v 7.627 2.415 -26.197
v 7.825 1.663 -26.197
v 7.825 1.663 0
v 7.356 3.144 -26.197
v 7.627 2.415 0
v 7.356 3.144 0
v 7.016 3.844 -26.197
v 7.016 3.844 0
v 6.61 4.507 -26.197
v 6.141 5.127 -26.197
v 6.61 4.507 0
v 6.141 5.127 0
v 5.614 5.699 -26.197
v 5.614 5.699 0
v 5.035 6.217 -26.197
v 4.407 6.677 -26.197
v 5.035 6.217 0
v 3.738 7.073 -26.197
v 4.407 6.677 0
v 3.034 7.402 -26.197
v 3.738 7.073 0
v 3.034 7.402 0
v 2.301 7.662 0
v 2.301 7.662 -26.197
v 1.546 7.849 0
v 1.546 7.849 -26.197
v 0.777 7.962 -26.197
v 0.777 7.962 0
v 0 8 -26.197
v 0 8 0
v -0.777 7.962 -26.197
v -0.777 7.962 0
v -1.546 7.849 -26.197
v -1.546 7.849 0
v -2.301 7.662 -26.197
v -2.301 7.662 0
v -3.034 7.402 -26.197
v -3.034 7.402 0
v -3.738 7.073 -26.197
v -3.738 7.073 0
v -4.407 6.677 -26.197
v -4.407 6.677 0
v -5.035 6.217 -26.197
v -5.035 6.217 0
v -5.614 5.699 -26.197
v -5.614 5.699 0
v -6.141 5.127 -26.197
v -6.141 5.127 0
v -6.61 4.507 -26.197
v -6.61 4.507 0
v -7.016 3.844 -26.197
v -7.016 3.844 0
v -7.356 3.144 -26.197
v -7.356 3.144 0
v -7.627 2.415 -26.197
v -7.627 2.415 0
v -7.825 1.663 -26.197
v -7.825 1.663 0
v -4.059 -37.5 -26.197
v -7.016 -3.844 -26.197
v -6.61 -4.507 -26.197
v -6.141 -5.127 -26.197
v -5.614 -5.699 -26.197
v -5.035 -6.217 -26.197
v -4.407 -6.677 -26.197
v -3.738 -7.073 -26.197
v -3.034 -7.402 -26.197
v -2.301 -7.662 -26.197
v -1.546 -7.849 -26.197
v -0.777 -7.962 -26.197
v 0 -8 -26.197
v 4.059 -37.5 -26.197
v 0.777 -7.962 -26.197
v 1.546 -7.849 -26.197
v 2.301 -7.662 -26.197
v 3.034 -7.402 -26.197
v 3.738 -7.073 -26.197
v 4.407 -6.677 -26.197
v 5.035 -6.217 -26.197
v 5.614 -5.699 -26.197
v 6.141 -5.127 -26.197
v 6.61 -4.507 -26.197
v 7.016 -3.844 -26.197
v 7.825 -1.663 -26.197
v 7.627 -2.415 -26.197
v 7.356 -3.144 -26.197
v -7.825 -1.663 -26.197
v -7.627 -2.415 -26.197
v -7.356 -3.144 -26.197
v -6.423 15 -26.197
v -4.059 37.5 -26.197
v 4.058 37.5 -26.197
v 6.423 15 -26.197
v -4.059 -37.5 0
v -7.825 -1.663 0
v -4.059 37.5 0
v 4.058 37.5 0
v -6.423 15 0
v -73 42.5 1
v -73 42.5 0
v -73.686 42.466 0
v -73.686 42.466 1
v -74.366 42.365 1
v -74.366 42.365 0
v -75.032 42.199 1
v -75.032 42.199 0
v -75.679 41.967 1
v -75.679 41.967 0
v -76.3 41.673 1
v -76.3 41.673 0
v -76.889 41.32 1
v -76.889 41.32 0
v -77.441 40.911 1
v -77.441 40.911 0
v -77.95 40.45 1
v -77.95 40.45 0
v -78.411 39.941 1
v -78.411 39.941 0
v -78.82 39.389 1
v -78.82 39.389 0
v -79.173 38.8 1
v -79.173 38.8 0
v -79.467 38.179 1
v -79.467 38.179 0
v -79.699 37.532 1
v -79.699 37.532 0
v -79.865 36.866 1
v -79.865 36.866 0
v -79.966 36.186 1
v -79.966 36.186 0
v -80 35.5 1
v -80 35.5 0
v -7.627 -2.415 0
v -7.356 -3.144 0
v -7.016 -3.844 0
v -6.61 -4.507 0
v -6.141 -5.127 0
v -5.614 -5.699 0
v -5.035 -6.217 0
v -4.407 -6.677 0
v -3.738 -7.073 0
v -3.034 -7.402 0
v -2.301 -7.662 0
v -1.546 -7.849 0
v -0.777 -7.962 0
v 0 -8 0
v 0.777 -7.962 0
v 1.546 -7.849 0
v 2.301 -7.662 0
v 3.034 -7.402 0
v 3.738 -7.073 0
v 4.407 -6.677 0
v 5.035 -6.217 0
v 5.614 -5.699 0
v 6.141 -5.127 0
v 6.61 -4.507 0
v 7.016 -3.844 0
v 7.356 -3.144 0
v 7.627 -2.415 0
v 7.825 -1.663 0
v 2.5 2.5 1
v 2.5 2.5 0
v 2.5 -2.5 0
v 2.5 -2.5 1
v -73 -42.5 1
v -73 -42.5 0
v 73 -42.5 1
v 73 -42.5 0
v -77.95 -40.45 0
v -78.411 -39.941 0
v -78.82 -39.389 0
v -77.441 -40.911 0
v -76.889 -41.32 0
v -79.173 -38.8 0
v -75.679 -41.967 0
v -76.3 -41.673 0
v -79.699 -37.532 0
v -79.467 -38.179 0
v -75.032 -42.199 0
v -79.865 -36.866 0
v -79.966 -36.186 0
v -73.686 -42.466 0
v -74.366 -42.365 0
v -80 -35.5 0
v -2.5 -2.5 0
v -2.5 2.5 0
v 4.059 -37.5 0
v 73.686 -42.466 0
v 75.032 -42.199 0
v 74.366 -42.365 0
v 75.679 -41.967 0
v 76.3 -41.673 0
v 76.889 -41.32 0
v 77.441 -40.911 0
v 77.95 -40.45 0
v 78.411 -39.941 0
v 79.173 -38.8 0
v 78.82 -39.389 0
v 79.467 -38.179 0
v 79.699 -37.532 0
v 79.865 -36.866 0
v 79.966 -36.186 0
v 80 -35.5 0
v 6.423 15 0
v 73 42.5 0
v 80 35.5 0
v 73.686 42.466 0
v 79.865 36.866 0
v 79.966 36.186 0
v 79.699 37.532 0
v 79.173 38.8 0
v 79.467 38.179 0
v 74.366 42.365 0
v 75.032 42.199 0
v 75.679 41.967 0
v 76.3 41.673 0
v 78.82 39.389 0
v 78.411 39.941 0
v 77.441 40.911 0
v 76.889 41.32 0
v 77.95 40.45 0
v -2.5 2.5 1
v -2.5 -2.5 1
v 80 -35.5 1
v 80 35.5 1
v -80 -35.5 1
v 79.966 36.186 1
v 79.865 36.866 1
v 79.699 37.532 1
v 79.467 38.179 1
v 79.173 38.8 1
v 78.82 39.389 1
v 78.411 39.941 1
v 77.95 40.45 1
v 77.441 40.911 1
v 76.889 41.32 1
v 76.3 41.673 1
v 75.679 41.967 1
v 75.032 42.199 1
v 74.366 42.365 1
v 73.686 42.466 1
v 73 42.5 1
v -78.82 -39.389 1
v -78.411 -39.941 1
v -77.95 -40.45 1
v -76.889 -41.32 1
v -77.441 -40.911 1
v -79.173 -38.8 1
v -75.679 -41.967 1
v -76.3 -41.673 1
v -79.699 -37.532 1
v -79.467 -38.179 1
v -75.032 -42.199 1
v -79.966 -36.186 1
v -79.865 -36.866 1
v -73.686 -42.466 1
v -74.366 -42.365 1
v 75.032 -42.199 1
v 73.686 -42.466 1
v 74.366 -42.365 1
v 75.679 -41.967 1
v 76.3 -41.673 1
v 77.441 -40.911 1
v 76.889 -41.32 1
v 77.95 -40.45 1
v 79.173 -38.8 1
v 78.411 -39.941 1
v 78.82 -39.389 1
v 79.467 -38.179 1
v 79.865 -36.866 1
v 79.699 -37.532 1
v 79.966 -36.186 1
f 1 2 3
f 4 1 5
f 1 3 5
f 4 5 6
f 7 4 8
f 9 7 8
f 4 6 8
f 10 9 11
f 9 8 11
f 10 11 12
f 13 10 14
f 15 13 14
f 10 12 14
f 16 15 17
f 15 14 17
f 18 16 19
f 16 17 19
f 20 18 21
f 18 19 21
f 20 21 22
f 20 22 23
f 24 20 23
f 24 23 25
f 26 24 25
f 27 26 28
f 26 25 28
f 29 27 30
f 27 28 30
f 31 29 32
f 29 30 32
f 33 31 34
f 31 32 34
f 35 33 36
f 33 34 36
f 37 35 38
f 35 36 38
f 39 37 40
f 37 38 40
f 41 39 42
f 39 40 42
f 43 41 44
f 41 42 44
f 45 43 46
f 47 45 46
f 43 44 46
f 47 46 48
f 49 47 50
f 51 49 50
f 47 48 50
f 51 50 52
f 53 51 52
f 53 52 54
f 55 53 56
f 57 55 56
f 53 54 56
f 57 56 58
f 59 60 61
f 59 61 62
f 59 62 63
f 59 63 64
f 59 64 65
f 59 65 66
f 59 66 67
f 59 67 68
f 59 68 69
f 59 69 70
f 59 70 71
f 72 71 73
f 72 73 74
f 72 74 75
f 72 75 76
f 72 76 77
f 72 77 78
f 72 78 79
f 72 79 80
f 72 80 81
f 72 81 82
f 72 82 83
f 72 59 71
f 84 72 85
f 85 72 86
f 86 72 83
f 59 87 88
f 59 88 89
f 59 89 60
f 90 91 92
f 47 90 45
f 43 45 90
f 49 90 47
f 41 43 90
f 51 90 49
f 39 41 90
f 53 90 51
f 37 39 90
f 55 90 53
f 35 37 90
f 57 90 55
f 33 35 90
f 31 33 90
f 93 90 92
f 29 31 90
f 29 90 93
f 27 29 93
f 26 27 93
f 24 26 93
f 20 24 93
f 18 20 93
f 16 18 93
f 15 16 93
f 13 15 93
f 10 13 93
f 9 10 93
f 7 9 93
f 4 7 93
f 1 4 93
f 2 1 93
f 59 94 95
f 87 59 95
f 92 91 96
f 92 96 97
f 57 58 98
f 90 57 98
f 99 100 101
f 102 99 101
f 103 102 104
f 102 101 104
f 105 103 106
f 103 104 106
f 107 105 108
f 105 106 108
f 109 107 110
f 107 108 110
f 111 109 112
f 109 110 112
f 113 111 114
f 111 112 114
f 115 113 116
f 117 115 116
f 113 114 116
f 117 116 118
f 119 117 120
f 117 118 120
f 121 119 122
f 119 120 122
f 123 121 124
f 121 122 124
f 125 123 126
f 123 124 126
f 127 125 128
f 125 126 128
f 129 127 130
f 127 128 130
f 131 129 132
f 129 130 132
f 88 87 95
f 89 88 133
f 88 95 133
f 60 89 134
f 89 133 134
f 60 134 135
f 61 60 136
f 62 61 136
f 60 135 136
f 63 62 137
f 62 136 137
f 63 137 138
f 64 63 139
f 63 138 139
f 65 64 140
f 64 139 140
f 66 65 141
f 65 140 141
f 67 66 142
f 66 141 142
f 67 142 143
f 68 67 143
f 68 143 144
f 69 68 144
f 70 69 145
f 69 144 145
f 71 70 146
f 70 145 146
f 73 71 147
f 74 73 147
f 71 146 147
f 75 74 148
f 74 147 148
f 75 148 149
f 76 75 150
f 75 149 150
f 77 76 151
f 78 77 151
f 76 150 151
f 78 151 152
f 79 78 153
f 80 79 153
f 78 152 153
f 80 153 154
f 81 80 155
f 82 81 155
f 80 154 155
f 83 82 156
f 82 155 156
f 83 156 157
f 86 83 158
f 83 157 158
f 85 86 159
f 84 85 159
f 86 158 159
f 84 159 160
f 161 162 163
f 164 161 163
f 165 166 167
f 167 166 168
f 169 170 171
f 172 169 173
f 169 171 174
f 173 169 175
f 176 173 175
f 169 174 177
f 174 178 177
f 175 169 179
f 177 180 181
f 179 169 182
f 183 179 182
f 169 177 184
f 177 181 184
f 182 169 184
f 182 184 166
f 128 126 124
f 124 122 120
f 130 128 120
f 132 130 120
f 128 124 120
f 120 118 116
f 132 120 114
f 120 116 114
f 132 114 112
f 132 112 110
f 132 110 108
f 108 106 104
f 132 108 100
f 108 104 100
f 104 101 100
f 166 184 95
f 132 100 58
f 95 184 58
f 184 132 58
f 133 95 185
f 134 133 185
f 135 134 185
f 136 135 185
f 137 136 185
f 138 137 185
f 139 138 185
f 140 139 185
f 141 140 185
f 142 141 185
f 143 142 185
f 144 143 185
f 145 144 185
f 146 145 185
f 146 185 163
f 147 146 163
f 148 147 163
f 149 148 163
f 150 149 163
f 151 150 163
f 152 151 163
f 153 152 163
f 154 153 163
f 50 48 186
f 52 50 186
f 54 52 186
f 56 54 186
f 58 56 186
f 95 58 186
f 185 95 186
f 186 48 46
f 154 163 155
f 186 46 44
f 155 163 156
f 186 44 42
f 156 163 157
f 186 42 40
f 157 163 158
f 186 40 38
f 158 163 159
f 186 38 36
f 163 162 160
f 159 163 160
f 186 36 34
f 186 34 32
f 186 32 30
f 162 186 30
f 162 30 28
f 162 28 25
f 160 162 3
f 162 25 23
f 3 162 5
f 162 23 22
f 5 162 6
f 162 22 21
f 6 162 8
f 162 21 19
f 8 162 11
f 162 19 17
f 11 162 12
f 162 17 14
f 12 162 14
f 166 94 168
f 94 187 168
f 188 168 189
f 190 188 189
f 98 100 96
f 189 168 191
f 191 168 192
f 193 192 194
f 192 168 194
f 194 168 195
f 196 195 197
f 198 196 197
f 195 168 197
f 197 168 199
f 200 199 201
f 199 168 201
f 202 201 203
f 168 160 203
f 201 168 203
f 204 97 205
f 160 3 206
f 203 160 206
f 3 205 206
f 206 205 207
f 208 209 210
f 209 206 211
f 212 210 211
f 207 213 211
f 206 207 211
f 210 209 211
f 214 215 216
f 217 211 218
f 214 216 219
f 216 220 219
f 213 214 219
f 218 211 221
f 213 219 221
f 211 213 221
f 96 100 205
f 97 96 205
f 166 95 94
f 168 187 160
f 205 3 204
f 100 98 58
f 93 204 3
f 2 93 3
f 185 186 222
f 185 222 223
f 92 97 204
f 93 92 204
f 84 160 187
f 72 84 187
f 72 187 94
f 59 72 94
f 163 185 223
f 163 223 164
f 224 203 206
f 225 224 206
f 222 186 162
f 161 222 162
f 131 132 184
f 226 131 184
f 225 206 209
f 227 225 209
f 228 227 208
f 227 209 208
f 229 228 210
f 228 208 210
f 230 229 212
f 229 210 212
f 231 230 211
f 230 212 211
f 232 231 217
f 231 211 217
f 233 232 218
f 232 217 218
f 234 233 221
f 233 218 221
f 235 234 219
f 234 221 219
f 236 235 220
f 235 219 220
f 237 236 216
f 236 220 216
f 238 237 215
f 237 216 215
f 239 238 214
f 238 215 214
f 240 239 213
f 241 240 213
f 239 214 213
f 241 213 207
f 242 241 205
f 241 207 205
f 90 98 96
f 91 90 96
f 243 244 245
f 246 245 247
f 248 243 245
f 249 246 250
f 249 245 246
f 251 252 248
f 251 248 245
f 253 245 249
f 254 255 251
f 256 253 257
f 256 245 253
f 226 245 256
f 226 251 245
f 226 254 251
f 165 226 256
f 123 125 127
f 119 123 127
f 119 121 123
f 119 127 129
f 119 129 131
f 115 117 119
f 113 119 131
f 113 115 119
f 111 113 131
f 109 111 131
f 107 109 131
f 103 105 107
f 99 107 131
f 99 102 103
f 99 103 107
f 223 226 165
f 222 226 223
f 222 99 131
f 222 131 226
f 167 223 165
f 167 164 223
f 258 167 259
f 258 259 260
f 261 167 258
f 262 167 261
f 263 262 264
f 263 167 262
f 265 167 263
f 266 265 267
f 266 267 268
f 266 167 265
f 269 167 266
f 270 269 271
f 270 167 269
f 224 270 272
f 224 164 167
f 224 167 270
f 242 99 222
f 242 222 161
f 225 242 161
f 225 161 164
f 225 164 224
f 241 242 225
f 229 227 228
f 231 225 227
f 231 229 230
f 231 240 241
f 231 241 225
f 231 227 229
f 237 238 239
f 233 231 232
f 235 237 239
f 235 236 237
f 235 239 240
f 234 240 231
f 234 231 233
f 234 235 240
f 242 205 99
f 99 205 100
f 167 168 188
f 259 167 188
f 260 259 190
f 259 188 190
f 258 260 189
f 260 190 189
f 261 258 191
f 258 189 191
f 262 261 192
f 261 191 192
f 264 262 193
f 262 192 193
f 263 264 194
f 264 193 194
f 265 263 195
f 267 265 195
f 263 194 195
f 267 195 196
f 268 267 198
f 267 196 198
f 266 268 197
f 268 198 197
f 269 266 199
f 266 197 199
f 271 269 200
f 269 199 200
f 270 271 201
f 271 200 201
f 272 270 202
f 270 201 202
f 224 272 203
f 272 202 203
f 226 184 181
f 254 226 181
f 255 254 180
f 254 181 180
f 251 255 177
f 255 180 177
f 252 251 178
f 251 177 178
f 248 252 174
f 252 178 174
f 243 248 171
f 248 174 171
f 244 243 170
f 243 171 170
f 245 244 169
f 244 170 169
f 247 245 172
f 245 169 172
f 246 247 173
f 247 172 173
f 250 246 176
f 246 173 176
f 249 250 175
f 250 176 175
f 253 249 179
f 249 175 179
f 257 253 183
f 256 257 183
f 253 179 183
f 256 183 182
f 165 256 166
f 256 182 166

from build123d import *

# Parameters (mm, degrees)
F0_R     = 8
F1_DEPTH = 1
F4_W     = 5
F4_H     = 5
F5_DEPTH = 25
F6_DEPTH = 26.197


with BuildPart() as f1:
    # F0 (on Top) → F1 (new body)
    with BuildSketch(Plane.XY):
        with BuildLine():
            Line((-73, -42.5), (73, -42.5))
            ThreePointArc((73, -42.5), (77.9497474683, -40.4497474683), (80, -35.5))
            Line((80, -35.5), (80, 35.5))
            ThreePointArc((80, 35.5), (77.9497474683, 40.4497474683), (73, 42.5))
            Line((73, 42.5), (-73, 42.5))
            ThreePointArc((-73, 42.5), (-77.9497474683, 40.4497474683), (-80, 35.5))
            Line((-80, 35.5), (-80, -35.5))
            ThreePointArc((-80, -35.5), (-77.9497474683, -40.4497474683), (-73, -42.5))
        make_face()
        Circle(F0_R, mode=Mode.SUBTRACT)
        Circle(F0_R)
    extrude(amount=F1_DEPTH)

    # F4 (on face) → F5 (cut)
    with BuildSketch(Plane(origin=(0, 0, 0), x_dir=(1, 0, 0), z_dir=(0, 0, -1))):
        Rectangle(F4_W, F4_H)
    extrude(amount=-F5_DEPTH, mode=Mode.SUBTRACT)

    # F3 (on face) → F6 (join)
    with BuildSketch(Plane(origin=(0, 0, 0), x_dir=(1, 0, 0), z_dir=(0, 0, -1))):
        with BuildLine():
            ThreePointArc((-7.8251753865, 1.6633190224), (0, 8), (7.8251753865, 1.6633190224))
            Line((7.8251753865, 1.6633190224), (5.3723529412, 25))
            Line((5.3723529412, 25), (-5.3723529412, 25))
            Line((-5.3723529412, 25), (-7.8251753865, 1.6633190224))
        make_face()
        with BuildLine():
            Line((6.4233442804, -15), (7.8251605833, -1.6633886632))
            ThreePointArc((7.8251605833, -1.6633886632), (-3.55984e-05, -7.9999999999), (-7.8251753865, -1.6633190224))
            Line((-7.8251753865, -1.6633190224), (-6.4234117647, -15))
            Line((-6.4234117647, -15), (3.0757090009, -15))
            Line((3.0757090009, -15), (6.4233442804, -15))
        make_face()
        Polygon((-5.3723529412, 25), (5.3723529412, 25), (4.0585294118, 37.5), (-4.0585294118, 37.5), align=None)
        Polygon((4.0583607009, -37.5), (6.4233442804, -15), (3.0757090009, -15), (-6.4234117647, -15), (-4.0585294118, -37.5), align=None)
    extrude(amount=F6_DEPTH)


solid = f1.part
